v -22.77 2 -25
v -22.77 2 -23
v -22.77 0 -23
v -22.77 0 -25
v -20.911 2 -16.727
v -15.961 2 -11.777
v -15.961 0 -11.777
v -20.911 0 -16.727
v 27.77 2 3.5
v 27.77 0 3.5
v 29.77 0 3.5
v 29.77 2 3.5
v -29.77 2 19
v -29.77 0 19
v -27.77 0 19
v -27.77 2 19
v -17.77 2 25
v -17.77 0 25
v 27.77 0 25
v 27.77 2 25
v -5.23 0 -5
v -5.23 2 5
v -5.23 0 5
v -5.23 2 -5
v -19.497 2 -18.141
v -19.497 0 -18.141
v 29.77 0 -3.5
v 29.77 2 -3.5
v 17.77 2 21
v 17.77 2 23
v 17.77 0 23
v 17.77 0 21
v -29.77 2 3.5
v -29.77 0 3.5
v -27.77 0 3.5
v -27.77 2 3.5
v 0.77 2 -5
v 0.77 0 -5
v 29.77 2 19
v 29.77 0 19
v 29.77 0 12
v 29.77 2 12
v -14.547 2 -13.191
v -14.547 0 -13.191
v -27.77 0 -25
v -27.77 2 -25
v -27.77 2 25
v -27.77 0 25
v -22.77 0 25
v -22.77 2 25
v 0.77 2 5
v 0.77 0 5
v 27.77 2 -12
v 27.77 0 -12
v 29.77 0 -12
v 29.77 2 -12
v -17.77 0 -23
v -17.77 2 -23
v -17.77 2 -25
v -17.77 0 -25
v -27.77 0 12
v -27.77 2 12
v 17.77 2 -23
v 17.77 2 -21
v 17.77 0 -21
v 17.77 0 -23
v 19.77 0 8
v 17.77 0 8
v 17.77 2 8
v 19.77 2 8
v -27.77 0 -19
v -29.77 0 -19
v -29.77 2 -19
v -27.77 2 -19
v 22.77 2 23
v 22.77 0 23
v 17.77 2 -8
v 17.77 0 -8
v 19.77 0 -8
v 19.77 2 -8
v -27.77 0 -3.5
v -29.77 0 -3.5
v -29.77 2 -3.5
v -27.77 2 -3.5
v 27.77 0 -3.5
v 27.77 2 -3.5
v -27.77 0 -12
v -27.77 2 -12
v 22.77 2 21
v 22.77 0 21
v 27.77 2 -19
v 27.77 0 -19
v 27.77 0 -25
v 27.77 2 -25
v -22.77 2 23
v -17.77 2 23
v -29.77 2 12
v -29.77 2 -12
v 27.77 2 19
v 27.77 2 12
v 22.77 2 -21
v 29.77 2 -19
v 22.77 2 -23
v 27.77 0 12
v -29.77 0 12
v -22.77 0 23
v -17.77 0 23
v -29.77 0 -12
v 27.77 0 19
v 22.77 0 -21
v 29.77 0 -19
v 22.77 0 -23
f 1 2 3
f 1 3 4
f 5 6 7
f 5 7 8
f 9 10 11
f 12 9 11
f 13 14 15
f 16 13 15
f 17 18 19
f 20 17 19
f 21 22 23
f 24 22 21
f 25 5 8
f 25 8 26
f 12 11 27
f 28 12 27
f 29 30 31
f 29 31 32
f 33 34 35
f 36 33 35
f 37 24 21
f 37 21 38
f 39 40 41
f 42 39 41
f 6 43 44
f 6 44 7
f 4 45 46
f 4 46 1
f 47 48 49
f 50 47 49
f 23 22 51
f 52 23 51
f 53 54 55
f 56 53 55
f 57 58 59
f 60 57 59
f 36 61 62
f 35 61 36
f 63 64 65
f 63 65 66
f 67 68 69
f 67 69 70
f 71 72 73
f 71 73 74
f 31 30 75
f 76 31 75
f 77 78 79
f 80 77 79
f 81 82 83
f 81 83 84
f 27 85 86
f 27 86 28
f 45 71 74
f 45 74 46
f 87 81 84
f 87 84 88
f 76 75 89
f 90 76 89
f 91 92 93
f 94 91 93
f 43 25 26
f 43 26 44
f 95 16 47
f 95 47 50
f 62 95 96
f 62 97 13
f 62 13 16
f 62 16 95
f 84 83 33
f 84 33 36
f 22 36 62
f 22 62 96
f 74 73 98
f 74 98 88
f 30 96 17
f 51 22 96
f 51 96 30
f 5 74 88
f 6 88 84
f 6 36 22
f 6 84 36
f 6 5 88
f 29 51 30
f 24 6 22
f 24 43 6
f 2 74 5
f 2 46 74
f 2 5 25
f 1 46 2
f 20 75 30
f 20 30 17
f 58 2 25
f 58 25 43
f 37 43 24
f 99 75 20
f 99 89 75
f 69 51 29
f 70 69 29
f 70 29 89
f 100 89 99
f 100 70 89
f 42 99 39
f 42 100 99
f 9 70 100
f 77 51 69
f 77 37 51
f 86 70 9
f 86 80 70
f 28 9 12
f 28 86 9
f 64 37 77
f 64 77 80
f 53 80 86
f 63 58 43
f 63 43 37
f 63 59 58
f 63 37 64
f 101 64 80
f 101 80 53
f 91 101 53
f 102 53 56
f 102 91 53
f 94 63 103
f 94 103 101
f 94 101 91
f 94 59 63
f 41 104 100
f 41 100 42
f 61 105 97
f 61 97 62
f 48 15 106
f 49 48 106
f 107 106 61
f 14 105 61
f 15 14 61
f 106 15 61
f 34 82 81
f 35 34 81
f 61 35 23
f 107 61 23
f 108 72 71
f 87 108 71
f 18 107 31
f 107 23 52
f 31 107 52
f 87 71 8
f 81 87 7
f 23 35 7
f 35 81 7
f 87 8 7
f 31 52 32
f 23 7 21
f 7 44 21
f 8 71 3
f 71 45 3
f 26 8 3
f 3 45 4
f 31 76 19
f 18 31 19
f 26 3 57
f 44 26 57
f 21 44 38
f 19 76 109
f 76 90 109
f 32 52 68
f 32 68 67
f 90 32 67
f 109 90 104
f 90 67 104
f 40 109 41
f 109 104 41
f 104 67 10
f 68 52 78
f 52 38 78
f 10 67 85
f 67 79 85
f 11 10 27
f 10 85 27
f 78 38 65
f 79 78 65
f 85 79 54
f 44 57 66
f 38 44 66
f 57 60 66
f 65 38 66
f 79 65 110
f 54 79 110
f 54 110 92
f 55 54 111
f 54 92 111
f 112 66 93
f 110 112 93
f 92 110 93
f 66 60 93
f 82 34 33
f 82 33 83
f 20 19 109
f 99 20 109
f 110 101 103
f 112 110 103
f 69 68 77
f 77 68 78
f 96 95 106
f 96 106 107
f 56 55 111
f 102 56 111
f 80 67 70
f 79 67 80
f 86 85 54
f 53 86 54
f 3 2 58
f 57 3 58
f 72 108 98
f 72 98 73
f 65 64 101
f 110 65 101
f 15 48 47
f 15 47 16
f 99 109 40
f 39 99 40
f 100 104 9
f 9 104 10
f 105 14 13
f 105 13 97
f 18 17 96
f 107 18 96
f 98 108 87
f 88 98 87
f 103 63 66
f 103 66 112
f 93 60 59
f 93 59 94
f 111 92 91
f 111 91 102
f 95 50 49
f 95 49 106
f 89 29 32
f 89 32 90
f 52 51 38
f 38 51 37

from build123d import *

# Parameters (mm, degrees)
SKETCH1_W           = 55.54
SKETCH1_H           = 50
SKETCH1_W_2         = 2
SKETCH1_H_2         = 16
SKETCH1_H_3         = 7
BOSS_EXTRUDE1_DEPTH = 2
SKETCH3_W           = 5
SKETCH3_H           = 2
CUT_EXTRUDE1_DEPTH  = 2
SKETCH4_W           = 6
SKETCH4_H           = 10
CUT_EXTRUDE2_DEPTH  = 2
CUT_EXTRUDE3_DEPTH  = 2


with BuildPart() as part:
    # Sketch1 → Boss-Extrude1 (new body)
    # profile 1 of 7: a face of its own
    with BuildSketch(Plane(origin=(0, 0, 0), x_dir=(1, 0, 0), z_dir=(0, 1, 0))):
        Rectangle(SKETCH1_W, SKETCH1_H)
        with Locations((18.77, 0)):
            Rectangle(SKETCH1_W_2, SKETCH1_H_2, mode=Mode.SUBTRACT)
    # profile 2 of 7: a face of its own
    with BuildSketch(Plane(origin=(0, 0, 0), x_dir=(1, 0, 0), z_dir=(0, 1, 0))):
        with Locations((28.77, 0)):
            Rectangle(SKETCH1_W_2, SKETCH1_H_3)
    # profile 3 of 7: a face of its own
    with BuildSketch(Plane(origin=(0, 0, 0), x_dir=(1, 0, 0), z_dir=(0, 1, 0))):
        with Locations((28.77, 15.5)):
            Rectangle(SKETCH1_W_2, SKETCH1_H_3)
    # profile 4 of 7: a face of its own
    with BuildSketch(Plane(origin=(0, 0, 0), x_dir=(1, 0, 0), z_dir=(0, 1, 0))):
        with Locations((28.77, -15.5)):
            Rectangle(SKETCH1_W_2, SKETCH1_H_3)
    # profile 5 of 7: a face of its own
    with BuildSketch(Plane(origin=(0, 0, 0), x_dir=(1, 0, 0), z_dir=(0, 1, 0))):
        with Locations((-28.77, 0)):
            Rectangle(SKETCH1_W_2, SKETCH1_H_3)
    # profile 6 of 7: a face of its own
    with BuildSketch(Plane(origin=(0, 0, 0), x_dir=(1, 0, 0), z_dir=(0, 1, 0))):
        with Locations((-28.77, -15.5)):
            Rectangle(SKETCH1_W_2, SKETCH1_H_3)
    # profile 7 of 7: a face of its own
    with BuildSketch(Plane(origin=(0, 0, 0), x_dir=(1, 0, 0), z_dir=(0, 1, 0))):
        with Locations((-28.77, 15.5)):
            Rectangle(SKETCH1_W_2, SKETCH1_H_3)
    extrude(amount=BOSS_EXTRUDE1_DEPTH)

    # Sketch3 → Cut-Extrude1 (cut)
    with BuildSketch(Plane(origin=(0, 2, 0), x_dir=(1, 0, 0), z_dir=(0, 1, 0))):
        with Locations((20.27, -22)):
            Rectangle(SKETCH3_W, SKETCH3_H)
        with Locations((20.27, 22)):
            Rectangle(SKETCH3_W, SKETCH3_H)
        with Locations((-20.27, 24)):
            Rectangle(SKETCH3_W, SKETCH3_H)
        with Locations((-20.27, -24)):
            Rectangle(SKETCH3_W, SKETCH3_H)
    extrude(amount=-CUT_EXTRUDE1_DEPTH, mode=Mode.SUBTRACT)

    # Sketch4 → Cut-Extrude2 (cut)
    with BuildSketch(Plane(origin=(0, 2, 0), x_dir=(1, 0, 0), z_dir=(0, 1, 0))):
        with Locations((-2.23, 0)):
            Rectangle(SKETCH4_W, SKETCH4_H)
    extrude(amount=-CUT_EXTRUDE2_DEPTH, mode=Mode.SUBTRACT)

    # Sketch5 → Cut-Extrude3 (cut)
    with BuildSketch(Plane(origin=(0, 2, 0), x_dir=(1, 0, 0), z_dir=(0, 1, 0))):
        Polygon((-19.496864222, 18.141064222), (-14.547116754, 13.191316754), (-15.961330317, 11.777103192), (-20.911077785, 16.72685066), align=None)
    extrude(amount=-CUT_EXTRUDE3_DEPTH, mode=Mode.SUBTRACT)


solid = part.part
